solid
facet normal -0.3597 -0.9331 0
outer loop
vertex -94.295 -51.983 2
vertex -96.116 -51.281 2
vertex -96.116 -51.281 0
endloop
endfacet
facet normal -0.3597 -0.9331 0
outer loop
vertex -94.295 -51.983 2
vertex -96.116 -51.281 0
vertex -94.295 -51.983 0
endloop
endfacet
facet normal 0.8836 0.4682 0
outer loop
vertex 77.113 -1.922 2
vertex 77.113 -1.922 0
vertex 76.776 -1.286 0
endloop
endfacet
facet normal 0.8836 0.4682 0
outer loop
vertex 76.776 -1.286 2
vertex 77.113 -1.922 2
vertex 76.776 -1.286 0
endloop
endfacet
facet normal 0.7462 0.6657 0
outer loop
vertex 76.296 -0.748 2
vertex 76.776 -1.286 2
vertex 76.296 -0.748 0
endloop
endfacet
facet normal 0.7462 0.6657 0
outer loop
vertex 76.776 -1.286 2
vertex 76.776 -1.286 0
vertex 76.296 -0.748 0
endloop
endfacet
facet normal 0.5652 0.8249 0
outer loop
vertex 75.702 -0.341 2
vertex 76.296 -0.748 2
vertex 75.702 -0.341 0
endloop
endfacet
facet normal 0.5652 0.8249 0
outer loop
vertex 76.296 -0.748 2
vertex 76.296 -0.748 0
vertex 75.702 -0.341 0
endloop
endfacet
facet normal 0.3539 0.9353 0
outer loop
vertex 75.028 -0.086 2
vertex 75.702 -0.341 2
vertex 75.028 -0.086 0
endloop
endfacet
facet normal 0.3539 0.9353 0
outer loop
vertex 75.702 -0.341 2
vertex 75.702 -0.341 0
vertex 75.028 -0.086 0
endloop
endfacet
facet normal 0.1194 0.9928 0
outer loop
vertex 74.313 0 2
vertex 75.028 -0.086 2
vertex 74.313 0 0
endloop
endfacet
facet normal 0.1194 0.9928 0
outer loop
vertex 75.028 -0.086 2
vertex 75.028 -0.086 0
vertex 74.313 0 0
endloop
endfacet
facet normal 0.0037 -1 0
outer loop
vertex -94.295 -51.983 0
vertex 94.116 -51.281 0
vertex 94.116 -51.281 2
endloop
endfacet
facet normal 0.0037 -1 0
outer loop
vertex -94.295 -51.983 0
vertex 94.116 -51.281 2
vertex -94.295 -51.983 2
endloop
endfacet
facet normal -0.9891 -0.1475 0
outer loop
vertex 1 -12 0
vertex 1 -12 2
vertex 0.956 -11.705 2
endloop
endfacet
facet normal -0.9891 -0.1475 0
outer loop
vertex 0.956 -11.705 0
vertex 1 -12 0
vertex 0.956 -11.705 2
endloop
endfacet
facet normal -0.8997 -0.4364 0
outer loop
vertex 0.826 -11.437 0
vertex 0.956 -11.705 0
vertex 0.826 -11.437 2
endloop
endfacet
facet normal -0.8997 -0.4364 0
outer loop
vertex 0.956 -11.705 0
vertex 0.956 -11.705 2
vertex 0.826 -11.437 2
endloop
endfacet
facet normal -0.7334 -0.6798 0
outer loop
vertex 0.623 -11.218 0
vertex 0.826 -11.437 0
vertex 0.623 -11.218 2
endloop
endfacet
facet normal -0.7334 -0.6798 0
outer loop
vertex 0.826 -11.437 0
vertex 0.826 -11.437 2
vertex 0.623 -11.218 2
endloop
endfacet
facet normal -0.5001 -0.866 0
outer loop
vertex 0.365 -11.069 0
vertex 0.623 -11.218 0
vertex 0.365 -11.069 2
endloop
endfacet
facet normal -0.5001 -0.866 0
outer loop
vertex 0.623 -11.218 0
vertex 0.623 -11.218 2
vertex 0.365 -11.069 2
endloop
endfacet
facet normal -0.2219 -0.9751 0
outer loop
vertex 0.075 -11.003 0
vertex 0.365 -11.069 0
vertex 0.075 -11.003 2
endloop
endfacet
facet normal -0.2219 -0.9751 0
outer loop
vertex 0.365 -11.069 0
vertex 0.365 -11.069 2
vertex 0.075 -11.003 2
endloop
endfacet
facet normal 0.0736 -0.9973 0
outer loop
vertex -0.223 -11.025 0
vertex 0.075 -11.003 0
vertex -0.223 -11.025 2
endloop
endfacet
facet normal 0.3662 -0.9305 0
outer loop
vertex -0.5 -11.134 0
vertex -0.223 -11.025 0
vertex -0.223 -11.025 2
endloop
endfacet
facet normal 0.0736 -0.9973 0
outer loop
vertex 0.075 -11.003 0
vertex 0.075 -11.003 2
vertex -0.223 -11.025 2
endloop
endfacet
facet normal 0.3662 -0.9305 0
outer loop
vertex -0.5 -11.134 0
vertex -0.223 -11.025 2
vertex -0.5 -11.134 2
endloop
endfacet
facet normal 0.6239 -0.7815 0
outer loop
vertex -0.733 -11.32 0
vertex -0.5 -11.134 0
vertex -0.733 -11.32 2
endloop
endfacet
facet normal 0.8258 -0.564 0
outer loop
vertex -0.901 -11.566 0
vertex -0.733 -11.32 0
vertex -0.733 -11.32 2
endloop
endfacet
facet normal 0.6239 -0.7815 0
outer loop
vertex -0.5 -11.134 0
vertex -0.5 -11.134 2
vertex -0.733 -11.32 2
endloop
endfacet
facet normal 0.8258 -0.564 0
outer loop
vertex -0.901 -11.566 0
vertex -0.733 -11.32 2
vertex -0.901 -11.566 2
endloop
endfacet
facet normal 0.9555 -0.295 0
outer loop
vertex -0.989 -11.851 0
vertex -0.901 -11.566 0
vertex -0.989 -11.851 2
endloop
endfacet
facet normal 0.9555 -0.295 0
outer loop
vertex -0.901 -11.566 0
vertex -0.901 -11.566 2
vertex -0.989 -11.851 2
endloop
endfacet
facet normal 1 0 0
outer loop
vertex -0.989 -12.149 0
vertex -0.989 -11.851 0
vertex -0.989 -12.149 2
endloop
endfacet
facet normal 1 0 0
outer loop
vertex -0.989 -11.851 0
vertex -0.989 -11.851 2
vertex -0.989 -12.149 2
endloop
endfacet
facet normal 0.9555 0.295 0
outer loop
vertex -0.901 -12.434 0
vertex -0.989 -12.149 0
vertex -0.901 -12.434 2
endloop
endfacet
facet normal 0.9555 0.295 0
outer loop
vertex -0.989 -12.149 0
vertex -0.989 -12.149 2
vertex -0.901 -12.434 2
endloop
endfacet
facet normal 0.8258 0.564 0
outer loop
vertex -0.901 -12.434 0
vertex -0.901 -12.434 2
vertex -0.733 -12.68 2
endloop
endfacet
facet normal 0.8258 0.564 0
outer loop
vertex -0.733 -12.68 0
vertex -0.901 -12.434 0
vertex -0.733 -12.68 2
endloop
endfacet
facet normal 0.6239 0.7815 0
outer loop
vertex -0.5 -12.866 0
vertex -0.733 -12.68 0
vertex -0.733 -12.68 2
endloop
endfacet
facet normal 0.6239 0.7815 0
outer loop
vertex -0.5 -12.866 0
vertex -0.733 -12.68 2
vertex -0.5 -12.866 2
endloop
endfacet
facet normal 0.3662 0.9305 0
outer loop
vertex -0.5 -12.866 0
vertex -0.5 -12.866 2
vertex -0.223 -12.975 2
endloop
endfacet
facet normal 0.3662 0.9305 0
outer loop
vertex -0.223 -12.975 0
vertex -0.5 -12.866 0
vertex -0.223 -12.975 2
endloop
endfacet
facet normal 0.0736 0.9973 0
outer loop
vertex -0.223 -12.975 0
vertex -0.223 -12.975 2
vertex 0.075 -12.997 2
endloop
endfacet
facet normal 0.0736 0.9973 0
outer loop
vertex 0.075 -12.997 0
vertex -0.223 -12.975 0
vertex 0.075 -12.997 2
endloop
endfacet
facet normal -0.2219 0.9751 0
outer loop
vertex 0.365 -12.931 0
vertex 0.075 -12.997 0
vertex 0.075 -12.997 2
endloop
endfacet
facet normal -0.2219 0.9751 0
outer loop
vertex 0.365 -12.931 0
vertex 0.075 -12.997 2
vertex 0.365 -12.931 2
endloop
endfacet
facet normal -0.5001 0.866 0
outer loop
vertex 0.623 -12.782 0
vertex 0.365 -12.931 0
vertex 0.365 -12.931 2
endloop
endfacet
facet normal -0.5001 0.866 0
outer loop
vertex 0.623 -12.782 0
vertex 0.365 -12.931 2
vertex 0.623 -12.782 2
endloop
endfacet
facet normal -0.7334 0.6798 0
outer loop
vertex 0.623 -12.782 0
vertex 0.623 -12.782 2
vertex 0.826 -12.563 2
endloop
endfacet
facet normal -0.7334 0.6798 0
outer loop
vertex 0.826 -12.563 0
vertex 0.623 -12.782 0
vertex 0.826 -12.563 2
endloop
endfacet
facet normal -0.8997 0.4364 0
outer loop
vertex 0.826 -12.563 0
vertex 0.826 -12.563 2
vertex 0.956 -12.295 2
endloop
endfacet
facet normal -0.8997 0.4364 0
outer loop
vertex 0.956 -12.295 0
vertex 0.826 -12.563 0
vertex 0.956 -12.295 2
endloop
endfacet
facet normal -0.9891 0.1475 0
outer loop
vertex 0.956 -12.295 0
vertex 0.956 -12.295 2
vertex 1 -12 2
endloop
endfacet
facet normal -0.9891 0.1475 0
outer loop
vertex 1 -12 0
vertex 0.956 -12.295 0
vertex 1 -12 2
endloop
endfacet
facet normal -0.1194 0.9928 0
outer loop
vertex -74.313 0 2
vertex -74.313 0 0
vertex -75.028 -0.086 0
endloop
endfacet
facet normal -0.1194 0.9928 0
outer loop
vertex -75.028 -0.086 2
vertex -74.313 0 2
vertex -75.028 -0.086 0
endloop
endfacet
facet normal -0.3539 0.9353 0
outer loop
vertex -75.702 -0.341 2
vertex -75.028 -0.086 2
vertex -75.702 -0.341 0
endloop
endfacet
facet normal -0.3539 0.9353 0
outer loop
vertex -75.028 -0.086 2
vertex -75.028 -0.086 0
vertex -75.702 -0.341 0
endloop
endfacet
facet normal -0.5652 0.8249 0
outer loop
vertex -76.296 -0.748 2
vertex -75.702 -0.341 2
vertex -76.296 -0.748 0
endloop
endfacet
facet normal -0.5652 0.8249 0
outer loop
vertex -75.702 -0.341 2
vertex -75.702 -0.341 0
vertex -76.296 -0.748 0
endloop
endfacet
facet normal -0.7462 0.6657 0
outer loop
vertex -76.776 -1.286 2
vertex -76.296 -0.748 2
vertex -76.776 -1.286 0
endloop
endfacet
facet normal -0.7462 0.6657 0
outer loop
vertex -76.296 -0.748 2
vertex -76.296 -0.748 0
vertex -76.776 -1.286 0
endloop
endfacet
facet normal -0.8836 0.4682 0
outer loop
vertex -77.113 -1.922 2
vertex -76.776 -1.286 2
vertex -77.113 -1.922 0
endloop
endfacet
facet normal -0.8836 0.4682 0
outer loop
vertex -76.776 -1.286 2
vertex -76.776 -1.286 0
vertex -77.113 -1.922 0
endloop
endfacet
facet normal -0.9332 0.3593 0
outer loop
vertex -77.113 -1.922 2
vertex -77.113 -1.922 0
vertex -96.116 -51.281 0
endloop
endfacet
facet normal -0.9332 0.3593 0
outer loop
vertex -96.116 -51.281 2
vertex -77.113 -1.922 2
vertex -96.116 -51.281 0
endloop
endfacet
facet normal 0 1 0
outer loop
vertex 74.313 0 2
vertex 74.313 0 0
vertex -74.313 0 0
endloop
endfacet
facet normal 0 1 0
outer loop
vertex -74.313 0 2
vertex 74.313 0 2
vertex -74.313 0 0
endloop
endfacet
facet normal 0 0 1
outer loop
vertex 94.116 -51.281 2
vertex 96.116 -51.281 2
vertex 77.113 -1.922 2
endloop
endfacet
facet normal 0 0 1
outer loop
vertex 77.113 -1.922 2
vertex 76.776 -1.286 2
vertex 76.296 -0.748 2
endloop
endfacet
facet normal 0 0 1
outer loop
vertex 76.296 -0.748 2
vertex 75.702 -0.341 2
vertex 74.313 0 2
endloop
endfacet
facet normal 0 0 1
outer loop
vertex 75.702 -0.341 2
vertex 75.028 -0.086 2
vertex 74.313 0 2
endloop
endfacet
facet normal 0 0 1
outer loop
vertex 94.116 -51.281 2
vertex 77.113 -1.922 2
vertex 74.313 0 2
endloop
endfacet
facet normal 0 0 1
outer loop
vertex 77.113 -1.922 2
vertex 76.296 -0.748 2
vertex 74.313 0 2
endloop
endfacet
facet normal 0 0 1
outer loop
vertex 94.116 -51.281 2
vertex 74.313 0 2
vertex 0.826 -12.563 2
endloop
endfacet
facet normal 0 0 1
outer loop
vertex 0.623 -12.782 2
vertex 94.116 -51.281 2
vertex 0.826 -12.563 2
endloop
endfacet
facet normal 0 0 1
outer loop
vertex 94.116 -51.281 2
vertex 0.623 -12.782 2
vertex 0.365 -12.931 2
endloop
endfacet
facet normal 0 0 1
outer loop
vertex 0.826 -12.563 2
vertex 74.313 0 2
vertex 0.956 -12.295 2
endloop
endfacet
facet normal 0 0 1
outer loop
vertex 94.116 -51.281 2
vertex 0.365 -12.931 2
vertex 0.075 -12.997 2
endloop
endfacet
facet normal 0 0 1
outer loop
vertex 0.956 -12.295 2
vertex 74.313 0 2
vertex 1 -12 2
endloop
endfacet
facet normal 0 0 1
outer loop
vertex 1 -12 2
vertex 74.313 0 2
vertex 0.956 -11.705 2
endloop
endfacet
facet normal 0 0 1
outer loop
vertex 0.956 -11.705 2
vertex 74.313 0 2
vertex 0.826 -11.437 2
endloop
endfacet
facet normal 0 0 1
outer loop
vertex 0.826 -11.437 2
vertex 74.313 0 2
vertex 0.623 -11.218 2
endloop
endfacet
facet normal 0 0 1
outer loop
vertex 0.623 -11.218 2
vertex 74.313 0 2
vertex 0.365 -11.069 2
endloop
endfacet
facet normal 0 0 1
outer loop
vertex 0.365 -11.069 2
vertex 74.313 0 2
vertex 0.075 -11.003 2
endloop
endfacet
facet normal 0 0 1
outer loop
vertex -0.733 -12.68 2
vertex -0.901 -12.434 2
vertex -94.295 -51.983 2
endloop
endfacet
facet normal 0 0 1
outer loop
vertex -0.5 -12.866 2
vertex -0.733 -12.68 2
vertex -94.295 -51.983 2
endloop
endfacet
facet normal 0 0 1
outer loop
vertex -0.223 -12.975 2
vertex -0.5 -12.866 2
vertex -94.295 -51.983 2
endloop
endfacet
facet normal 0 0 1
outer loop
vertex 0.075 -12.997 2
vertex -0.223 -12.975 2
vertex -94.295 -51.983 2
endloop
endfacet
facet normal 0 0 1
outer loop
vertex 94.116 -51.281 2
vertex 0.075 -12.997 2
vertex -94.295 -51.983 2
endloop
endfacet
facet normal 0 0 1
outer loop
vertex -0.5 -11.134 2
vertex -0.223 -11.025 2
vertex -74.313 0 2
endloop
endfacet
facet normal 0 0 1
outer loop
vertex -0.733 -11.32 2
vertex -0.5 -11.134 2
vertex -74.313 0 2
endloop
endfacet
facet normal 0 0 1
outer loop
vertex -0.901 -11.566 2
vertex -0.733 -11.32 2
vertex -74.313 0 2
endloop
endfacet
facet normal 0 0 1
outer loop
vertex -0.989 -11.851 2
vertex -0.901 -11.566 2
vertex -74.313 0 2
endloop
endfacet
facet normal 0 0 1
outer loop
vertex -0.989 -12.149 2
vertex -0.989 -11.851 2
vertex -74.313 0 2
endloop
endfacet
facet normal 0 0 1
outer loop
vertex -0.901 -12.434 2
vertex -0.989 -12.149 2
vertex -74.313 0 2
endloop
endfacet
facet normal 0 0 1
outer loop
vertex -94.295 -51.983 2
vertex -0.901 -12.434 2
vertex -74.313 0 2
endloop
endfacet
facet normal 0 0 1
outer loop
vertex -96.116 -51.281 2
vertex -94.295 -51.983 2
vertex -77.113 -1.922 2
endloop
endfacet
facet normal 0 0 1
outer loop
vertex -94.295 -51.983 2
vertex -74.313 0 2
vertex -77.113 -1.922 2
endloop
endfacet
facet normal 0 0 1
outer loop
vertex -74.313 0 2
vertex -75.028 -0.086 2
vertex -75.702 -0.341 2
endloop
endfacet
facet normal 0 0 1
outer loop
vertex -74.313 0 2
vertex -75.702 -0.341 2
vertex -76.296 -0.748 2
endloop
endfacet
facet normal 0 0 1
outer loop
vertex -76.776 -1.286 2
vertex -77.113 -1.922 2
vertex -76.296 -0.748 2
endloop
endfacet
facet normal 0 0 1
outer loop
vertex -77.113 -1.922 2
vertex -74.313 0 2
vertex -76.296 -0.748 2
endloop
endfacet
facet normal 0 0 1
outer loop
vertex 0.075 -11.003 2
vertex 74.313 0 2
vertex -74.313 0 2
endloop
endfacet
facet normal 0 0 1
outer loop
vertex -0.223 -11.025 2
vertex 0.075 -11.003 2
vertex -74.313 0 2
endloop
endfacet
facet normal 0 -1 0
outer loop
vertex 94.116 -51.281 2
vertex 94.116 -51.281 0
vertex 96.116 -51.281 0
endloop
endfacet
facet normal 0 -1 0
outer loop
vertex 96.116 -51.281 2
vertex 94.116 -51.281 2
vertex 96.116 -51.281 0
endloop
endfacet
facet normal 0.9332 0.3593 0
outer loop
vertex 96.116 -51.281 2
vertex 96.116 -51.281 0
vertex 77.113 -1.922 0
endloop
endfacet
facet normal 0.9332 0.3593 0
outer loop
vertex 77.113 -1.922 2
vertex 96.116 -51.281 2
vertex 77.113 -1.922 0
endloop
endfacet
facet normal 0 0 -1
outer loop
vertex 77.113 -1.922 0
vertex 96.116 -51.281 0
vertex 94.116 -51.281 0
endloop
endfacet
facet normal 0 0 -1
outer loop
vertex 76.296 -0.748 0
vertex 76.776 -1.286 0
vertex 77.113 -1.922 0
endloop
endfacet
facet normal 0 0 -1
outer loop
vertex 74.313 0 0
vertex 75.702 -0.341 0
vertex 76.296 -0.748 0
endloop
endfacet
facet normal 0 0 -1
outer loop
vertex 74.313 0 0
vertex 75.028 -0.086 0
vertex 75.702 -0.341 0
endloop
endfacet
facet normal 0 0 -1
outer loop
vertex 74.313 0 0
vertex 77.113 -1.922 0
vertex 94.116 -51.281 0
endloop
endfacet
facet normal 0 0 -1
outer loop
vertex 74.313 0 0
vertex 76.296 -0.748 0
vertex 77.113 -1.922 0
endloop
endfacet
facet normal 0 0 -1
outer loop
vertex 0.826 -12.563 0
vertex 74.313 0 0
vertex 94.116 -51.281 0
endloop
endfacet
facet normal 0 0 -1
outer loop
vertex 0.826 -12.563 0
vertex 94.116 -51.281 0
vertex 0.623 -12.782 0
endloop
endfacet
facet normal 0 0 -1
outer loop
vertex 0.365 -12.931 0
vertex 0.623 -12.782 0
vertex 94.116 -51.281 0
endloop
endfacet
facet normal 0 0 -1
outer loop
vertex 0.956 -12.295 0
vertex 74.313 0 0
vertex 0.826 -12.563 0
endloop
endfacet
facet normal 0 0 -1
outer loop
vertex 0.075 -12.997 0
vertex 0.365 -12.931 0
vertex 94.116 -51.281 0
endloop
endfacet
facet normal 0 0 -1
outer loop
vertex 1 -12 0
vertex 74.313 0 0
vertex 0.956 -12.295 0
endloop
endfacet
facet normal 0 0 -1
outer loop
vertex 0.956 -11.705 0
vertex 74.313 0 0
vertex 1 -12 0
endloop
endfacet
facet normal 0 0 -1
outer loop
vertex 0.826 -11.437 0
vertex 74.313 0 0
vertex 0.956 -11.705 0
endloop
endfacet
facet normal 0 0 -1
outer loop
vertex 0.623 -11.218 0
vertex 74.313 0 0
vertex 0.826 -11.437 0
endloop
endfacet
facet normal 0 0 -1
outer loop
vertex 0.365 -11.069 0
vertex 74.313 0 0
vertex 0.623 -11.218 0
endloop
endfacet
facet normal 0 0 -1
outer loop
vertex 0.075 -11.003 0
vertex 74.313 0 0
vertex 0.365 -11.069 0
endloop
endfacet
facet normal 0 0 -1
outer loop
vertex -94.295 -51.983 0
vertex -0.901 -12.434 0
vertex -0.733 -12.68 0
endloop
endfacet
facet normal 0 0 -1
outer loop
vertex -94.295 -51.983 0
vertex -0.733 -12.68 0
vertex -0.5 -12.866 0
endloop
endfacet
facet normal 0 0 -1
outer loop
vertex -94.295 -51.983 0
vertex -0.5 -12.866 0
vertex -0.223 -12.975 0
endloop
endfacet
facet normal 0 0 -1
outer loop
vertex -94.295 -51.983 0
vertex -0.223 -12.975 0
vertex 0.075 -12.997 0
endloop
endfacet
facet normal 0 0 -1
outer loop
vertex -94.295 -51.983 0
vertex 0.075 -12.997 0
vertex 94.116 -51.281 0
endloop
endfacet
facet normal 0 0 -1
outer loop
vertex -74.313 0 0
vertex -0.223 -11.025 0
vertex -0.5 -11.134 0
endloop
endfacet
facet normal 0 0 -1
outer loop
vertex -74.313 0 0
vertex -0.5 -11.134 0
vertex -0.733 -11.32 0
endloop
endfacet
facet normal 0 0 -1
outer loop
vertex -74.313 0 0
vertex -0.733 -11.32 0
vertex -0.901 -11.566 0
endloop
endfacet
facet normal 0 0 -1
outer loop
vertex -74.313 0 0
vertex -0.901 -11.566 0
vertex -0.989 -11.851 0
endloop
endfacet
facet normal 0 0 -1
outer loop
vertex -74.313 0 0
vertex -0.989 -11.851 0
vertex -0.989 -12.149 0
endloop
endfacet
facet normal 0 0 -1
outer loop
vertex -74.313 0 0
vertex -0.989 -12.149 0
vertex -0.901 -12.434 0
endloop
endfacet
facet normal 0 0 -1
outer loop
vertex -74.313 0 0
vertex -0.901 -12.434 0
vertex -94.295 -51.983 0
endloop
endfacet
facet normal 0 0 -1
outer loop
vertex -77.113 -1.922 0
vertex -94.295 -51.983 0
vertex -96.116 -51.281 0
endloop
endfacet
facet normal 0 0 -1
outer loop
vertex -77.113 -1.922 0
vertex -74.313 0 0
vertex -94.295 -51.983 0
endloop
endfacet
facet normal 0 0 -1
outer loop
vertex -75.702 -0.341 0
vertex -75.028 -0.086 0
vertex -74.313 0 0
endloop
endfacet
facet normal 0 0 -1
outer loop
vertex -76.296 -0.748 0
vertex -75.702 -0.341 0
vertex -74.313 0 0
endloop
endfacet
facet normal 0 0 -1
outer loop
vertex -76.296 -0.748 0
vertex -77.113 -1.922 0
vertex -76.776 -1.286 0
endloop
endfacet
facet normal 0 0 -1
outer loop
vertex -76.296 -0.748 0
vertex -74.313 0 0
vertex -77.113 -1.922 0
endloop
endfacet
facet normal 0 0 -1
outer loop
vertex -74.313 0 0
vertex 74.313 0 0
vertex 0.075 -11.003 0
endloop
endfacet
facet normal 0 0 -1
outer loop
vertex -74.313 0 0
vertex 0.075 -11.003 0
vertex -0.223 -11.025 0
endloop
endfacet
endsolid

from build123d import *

# Parameters (mm, degrees)
BOSS_EXTRUDE1_DEPTH = 2
SKETCH2_R           = 1
CUT_EXTRUDE1_DEPTH  = 10


with BuildPart() as part:
    # Sketch1 → Boss-Extrude1 (new body)
    with BuildSketch(Plane.XY):
        with BuildLine():
            ThreePointArc((-75.246672681, -2.507158848), (-74.879445737, -2.042044212), (-74.313447388, -1.866450586))
            Line((-74.313447388, -1.866450586), (74.313447388, -1.866450586))
            ThreePointArc((74.313447388, -1.866450586), (74.955034485, -2.065494638), (75.371304372, -2.592725061))
            Line((75.371304372, -2.592725061), (94.116450586, -51.281416525))
            Line((94.116450586, -51.281416525), (-94.294779137, -51.982760032))
            Line((-94.294779137, -51.982760032), (-75.246672681, -2.507158848))
        make_face()
        with BuildLine():
            Line((-94.294779137, -51.982760032), (-75.246672681, -2.507158848))
            ThreePointArc((-75.246672681, -2.507158848), (-74.879445737, -2.042044212), (-74.313447388, -1.866450586))
            Line((-74.313447388, -1.866450586), (74.313447388, -1.866450586))
            ThreePointArc((74.313447388, -1.866450586), (74.955034485, -2.065494638), (75.371304372, -2.592725061))
            Line((75.371304372, -2.592725061), (94.116450586, -51.281416525))
            Line((94.116450586, -51.281416525), (96.116450586, -51.281416525))
            Line((96.116450586, -51.281416525), (77.113123267, -1.922124787))
            ThreePointArc((77.113123267, -1.922124787), (76.011442435, -0.526780879), (74.313447388, 0))
            Line((74.313447388, 0), (25, 0))
            Line((25, 0), (-25, 0))
            Line((-25, 0), (-74.313447388, 0))
            ThreePointArc((-74.313447388, 0), (-76.011442435, -0.526780879), (-77.113123267, -1.922124787))
            Line((-77.113123267, -1.922124787), (-96.116450586, -51.281416525))
            Line((-96.116450586, -51.281416525), (-94.294779137, -51.982760032))
        make_face()
    extrude(amount=BOSS_EXTRUDE1_DEPTH)

    # Sketch2 → Cut-Extrude1 (cut)
    with BuildSketch(Plane.XY.offset(2)):
        with Locations((0, -12)):
            Circle(SKETCH2_R)
    extrude(amount=-CUT_EXTRUDE1_DEPTH, mode=Mode.SUBTRACT)


solid = part.part
